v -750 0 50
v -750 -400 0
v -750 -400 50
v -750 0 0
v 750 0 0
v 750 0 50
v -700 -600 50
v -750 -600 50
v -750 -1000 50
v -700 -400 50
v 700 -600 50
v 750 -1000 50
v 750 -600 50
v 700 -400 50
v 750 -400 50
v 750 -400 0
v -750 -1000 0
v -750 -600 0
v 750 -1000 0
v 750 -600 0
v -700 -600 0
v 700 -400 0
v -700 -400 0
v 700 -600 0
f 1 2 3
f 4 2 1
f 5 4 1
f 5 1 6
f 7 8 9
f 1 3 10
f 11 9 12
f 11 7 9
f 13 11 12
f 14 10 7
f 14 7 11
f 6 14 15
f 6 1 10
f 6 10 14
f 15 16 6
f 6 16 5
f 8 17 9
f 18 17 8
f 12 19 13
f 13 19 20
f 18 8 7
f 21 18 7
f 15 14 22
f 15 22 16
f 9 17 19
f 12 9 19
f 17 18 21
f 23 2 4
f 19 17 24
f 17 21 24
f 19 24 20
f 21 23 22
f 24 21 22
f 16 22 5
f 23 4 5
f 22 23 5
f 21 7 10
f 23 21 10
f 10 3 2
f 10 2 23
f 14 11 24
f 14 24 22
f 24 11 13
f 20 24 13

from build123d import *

# Parameters (mm, degrees)
SKIZZE1_W                       = 1500
SKIZZE1_H                       = 1000
AUFSATZ_LINEAR_AUSTRAGEN1_DEPTH = 50
SCHNITT_LINEAR_AUSTRAGEN1_REACH = 52
SKIZZE2_W                       = 50
SKIZZE2_H                       = 200
SCHNITT_LINEAR_AUSTRAGEN2_REACH = 52
SKIZZE3_W                       = 50
SKIZZE3_H                       = 200


with BuildPart() as part:
    # Skizze1 → Aufsatz-Linear austragen1 (new body)
    with BuildSketch(Plane.XY):
        with Locations((0, -500)):
            Rectangle(SKIZZE1_W, SKIZZE1_H)
    extrude(amount=AUFSATZ_LINEAR_AUSTRAGEN1_DEPTH)

    # Skizze2 → Schnitt-Linear austragen1 (cut, up to next)
    with BuildSketch(Plane.XY.offset(50), mode=Mode.PRIVATE) as schnitt_linear_austragen1_sk1:
        with Locations((-725, -500)):
            Rectangle(SKIZZE2_W, SKIZZE2_H)
    schnitt_linear_austragen1_tool1 = extrude(schnitt_linear_austragen1_sk1.sketch, amount=-SCHNITT_LINEAR_AUSTRAGEN1_REACH, mode=Mode.PRIVATE) & part.part
    add(schnitt_linear_austragen1_tool1.solids().sort_by_distance((-725, -500, 50))[0], mode=Mode.SUBTRACT)

    # Skizze3 → Schnitt-Linear austragen2 (cut, up to next)
    with BuildSketch(Plane.XY.offset(50), mode=Mode.PRIVATE) as schnitt_linear_austragen2_sk1:
        with Locations((725, -500)):
            Rectangle(SKIZZE3_W, SKIZZE3_H)
    schnitt_linear_austragen2_tool1 = extrude(schnitt_linear_austragen2_sk1.sketch, amount=-SCHNITT_LINEAR_AUSTRAGEN2_REACH, mode=Mode.PRIVATE) & part.part
    add(schnitt_linear_austragen2_tool1.solids().sort_by_distance((725, -500, 50))[0], mode=Mode.SUBTRACT)


solid = part.part
